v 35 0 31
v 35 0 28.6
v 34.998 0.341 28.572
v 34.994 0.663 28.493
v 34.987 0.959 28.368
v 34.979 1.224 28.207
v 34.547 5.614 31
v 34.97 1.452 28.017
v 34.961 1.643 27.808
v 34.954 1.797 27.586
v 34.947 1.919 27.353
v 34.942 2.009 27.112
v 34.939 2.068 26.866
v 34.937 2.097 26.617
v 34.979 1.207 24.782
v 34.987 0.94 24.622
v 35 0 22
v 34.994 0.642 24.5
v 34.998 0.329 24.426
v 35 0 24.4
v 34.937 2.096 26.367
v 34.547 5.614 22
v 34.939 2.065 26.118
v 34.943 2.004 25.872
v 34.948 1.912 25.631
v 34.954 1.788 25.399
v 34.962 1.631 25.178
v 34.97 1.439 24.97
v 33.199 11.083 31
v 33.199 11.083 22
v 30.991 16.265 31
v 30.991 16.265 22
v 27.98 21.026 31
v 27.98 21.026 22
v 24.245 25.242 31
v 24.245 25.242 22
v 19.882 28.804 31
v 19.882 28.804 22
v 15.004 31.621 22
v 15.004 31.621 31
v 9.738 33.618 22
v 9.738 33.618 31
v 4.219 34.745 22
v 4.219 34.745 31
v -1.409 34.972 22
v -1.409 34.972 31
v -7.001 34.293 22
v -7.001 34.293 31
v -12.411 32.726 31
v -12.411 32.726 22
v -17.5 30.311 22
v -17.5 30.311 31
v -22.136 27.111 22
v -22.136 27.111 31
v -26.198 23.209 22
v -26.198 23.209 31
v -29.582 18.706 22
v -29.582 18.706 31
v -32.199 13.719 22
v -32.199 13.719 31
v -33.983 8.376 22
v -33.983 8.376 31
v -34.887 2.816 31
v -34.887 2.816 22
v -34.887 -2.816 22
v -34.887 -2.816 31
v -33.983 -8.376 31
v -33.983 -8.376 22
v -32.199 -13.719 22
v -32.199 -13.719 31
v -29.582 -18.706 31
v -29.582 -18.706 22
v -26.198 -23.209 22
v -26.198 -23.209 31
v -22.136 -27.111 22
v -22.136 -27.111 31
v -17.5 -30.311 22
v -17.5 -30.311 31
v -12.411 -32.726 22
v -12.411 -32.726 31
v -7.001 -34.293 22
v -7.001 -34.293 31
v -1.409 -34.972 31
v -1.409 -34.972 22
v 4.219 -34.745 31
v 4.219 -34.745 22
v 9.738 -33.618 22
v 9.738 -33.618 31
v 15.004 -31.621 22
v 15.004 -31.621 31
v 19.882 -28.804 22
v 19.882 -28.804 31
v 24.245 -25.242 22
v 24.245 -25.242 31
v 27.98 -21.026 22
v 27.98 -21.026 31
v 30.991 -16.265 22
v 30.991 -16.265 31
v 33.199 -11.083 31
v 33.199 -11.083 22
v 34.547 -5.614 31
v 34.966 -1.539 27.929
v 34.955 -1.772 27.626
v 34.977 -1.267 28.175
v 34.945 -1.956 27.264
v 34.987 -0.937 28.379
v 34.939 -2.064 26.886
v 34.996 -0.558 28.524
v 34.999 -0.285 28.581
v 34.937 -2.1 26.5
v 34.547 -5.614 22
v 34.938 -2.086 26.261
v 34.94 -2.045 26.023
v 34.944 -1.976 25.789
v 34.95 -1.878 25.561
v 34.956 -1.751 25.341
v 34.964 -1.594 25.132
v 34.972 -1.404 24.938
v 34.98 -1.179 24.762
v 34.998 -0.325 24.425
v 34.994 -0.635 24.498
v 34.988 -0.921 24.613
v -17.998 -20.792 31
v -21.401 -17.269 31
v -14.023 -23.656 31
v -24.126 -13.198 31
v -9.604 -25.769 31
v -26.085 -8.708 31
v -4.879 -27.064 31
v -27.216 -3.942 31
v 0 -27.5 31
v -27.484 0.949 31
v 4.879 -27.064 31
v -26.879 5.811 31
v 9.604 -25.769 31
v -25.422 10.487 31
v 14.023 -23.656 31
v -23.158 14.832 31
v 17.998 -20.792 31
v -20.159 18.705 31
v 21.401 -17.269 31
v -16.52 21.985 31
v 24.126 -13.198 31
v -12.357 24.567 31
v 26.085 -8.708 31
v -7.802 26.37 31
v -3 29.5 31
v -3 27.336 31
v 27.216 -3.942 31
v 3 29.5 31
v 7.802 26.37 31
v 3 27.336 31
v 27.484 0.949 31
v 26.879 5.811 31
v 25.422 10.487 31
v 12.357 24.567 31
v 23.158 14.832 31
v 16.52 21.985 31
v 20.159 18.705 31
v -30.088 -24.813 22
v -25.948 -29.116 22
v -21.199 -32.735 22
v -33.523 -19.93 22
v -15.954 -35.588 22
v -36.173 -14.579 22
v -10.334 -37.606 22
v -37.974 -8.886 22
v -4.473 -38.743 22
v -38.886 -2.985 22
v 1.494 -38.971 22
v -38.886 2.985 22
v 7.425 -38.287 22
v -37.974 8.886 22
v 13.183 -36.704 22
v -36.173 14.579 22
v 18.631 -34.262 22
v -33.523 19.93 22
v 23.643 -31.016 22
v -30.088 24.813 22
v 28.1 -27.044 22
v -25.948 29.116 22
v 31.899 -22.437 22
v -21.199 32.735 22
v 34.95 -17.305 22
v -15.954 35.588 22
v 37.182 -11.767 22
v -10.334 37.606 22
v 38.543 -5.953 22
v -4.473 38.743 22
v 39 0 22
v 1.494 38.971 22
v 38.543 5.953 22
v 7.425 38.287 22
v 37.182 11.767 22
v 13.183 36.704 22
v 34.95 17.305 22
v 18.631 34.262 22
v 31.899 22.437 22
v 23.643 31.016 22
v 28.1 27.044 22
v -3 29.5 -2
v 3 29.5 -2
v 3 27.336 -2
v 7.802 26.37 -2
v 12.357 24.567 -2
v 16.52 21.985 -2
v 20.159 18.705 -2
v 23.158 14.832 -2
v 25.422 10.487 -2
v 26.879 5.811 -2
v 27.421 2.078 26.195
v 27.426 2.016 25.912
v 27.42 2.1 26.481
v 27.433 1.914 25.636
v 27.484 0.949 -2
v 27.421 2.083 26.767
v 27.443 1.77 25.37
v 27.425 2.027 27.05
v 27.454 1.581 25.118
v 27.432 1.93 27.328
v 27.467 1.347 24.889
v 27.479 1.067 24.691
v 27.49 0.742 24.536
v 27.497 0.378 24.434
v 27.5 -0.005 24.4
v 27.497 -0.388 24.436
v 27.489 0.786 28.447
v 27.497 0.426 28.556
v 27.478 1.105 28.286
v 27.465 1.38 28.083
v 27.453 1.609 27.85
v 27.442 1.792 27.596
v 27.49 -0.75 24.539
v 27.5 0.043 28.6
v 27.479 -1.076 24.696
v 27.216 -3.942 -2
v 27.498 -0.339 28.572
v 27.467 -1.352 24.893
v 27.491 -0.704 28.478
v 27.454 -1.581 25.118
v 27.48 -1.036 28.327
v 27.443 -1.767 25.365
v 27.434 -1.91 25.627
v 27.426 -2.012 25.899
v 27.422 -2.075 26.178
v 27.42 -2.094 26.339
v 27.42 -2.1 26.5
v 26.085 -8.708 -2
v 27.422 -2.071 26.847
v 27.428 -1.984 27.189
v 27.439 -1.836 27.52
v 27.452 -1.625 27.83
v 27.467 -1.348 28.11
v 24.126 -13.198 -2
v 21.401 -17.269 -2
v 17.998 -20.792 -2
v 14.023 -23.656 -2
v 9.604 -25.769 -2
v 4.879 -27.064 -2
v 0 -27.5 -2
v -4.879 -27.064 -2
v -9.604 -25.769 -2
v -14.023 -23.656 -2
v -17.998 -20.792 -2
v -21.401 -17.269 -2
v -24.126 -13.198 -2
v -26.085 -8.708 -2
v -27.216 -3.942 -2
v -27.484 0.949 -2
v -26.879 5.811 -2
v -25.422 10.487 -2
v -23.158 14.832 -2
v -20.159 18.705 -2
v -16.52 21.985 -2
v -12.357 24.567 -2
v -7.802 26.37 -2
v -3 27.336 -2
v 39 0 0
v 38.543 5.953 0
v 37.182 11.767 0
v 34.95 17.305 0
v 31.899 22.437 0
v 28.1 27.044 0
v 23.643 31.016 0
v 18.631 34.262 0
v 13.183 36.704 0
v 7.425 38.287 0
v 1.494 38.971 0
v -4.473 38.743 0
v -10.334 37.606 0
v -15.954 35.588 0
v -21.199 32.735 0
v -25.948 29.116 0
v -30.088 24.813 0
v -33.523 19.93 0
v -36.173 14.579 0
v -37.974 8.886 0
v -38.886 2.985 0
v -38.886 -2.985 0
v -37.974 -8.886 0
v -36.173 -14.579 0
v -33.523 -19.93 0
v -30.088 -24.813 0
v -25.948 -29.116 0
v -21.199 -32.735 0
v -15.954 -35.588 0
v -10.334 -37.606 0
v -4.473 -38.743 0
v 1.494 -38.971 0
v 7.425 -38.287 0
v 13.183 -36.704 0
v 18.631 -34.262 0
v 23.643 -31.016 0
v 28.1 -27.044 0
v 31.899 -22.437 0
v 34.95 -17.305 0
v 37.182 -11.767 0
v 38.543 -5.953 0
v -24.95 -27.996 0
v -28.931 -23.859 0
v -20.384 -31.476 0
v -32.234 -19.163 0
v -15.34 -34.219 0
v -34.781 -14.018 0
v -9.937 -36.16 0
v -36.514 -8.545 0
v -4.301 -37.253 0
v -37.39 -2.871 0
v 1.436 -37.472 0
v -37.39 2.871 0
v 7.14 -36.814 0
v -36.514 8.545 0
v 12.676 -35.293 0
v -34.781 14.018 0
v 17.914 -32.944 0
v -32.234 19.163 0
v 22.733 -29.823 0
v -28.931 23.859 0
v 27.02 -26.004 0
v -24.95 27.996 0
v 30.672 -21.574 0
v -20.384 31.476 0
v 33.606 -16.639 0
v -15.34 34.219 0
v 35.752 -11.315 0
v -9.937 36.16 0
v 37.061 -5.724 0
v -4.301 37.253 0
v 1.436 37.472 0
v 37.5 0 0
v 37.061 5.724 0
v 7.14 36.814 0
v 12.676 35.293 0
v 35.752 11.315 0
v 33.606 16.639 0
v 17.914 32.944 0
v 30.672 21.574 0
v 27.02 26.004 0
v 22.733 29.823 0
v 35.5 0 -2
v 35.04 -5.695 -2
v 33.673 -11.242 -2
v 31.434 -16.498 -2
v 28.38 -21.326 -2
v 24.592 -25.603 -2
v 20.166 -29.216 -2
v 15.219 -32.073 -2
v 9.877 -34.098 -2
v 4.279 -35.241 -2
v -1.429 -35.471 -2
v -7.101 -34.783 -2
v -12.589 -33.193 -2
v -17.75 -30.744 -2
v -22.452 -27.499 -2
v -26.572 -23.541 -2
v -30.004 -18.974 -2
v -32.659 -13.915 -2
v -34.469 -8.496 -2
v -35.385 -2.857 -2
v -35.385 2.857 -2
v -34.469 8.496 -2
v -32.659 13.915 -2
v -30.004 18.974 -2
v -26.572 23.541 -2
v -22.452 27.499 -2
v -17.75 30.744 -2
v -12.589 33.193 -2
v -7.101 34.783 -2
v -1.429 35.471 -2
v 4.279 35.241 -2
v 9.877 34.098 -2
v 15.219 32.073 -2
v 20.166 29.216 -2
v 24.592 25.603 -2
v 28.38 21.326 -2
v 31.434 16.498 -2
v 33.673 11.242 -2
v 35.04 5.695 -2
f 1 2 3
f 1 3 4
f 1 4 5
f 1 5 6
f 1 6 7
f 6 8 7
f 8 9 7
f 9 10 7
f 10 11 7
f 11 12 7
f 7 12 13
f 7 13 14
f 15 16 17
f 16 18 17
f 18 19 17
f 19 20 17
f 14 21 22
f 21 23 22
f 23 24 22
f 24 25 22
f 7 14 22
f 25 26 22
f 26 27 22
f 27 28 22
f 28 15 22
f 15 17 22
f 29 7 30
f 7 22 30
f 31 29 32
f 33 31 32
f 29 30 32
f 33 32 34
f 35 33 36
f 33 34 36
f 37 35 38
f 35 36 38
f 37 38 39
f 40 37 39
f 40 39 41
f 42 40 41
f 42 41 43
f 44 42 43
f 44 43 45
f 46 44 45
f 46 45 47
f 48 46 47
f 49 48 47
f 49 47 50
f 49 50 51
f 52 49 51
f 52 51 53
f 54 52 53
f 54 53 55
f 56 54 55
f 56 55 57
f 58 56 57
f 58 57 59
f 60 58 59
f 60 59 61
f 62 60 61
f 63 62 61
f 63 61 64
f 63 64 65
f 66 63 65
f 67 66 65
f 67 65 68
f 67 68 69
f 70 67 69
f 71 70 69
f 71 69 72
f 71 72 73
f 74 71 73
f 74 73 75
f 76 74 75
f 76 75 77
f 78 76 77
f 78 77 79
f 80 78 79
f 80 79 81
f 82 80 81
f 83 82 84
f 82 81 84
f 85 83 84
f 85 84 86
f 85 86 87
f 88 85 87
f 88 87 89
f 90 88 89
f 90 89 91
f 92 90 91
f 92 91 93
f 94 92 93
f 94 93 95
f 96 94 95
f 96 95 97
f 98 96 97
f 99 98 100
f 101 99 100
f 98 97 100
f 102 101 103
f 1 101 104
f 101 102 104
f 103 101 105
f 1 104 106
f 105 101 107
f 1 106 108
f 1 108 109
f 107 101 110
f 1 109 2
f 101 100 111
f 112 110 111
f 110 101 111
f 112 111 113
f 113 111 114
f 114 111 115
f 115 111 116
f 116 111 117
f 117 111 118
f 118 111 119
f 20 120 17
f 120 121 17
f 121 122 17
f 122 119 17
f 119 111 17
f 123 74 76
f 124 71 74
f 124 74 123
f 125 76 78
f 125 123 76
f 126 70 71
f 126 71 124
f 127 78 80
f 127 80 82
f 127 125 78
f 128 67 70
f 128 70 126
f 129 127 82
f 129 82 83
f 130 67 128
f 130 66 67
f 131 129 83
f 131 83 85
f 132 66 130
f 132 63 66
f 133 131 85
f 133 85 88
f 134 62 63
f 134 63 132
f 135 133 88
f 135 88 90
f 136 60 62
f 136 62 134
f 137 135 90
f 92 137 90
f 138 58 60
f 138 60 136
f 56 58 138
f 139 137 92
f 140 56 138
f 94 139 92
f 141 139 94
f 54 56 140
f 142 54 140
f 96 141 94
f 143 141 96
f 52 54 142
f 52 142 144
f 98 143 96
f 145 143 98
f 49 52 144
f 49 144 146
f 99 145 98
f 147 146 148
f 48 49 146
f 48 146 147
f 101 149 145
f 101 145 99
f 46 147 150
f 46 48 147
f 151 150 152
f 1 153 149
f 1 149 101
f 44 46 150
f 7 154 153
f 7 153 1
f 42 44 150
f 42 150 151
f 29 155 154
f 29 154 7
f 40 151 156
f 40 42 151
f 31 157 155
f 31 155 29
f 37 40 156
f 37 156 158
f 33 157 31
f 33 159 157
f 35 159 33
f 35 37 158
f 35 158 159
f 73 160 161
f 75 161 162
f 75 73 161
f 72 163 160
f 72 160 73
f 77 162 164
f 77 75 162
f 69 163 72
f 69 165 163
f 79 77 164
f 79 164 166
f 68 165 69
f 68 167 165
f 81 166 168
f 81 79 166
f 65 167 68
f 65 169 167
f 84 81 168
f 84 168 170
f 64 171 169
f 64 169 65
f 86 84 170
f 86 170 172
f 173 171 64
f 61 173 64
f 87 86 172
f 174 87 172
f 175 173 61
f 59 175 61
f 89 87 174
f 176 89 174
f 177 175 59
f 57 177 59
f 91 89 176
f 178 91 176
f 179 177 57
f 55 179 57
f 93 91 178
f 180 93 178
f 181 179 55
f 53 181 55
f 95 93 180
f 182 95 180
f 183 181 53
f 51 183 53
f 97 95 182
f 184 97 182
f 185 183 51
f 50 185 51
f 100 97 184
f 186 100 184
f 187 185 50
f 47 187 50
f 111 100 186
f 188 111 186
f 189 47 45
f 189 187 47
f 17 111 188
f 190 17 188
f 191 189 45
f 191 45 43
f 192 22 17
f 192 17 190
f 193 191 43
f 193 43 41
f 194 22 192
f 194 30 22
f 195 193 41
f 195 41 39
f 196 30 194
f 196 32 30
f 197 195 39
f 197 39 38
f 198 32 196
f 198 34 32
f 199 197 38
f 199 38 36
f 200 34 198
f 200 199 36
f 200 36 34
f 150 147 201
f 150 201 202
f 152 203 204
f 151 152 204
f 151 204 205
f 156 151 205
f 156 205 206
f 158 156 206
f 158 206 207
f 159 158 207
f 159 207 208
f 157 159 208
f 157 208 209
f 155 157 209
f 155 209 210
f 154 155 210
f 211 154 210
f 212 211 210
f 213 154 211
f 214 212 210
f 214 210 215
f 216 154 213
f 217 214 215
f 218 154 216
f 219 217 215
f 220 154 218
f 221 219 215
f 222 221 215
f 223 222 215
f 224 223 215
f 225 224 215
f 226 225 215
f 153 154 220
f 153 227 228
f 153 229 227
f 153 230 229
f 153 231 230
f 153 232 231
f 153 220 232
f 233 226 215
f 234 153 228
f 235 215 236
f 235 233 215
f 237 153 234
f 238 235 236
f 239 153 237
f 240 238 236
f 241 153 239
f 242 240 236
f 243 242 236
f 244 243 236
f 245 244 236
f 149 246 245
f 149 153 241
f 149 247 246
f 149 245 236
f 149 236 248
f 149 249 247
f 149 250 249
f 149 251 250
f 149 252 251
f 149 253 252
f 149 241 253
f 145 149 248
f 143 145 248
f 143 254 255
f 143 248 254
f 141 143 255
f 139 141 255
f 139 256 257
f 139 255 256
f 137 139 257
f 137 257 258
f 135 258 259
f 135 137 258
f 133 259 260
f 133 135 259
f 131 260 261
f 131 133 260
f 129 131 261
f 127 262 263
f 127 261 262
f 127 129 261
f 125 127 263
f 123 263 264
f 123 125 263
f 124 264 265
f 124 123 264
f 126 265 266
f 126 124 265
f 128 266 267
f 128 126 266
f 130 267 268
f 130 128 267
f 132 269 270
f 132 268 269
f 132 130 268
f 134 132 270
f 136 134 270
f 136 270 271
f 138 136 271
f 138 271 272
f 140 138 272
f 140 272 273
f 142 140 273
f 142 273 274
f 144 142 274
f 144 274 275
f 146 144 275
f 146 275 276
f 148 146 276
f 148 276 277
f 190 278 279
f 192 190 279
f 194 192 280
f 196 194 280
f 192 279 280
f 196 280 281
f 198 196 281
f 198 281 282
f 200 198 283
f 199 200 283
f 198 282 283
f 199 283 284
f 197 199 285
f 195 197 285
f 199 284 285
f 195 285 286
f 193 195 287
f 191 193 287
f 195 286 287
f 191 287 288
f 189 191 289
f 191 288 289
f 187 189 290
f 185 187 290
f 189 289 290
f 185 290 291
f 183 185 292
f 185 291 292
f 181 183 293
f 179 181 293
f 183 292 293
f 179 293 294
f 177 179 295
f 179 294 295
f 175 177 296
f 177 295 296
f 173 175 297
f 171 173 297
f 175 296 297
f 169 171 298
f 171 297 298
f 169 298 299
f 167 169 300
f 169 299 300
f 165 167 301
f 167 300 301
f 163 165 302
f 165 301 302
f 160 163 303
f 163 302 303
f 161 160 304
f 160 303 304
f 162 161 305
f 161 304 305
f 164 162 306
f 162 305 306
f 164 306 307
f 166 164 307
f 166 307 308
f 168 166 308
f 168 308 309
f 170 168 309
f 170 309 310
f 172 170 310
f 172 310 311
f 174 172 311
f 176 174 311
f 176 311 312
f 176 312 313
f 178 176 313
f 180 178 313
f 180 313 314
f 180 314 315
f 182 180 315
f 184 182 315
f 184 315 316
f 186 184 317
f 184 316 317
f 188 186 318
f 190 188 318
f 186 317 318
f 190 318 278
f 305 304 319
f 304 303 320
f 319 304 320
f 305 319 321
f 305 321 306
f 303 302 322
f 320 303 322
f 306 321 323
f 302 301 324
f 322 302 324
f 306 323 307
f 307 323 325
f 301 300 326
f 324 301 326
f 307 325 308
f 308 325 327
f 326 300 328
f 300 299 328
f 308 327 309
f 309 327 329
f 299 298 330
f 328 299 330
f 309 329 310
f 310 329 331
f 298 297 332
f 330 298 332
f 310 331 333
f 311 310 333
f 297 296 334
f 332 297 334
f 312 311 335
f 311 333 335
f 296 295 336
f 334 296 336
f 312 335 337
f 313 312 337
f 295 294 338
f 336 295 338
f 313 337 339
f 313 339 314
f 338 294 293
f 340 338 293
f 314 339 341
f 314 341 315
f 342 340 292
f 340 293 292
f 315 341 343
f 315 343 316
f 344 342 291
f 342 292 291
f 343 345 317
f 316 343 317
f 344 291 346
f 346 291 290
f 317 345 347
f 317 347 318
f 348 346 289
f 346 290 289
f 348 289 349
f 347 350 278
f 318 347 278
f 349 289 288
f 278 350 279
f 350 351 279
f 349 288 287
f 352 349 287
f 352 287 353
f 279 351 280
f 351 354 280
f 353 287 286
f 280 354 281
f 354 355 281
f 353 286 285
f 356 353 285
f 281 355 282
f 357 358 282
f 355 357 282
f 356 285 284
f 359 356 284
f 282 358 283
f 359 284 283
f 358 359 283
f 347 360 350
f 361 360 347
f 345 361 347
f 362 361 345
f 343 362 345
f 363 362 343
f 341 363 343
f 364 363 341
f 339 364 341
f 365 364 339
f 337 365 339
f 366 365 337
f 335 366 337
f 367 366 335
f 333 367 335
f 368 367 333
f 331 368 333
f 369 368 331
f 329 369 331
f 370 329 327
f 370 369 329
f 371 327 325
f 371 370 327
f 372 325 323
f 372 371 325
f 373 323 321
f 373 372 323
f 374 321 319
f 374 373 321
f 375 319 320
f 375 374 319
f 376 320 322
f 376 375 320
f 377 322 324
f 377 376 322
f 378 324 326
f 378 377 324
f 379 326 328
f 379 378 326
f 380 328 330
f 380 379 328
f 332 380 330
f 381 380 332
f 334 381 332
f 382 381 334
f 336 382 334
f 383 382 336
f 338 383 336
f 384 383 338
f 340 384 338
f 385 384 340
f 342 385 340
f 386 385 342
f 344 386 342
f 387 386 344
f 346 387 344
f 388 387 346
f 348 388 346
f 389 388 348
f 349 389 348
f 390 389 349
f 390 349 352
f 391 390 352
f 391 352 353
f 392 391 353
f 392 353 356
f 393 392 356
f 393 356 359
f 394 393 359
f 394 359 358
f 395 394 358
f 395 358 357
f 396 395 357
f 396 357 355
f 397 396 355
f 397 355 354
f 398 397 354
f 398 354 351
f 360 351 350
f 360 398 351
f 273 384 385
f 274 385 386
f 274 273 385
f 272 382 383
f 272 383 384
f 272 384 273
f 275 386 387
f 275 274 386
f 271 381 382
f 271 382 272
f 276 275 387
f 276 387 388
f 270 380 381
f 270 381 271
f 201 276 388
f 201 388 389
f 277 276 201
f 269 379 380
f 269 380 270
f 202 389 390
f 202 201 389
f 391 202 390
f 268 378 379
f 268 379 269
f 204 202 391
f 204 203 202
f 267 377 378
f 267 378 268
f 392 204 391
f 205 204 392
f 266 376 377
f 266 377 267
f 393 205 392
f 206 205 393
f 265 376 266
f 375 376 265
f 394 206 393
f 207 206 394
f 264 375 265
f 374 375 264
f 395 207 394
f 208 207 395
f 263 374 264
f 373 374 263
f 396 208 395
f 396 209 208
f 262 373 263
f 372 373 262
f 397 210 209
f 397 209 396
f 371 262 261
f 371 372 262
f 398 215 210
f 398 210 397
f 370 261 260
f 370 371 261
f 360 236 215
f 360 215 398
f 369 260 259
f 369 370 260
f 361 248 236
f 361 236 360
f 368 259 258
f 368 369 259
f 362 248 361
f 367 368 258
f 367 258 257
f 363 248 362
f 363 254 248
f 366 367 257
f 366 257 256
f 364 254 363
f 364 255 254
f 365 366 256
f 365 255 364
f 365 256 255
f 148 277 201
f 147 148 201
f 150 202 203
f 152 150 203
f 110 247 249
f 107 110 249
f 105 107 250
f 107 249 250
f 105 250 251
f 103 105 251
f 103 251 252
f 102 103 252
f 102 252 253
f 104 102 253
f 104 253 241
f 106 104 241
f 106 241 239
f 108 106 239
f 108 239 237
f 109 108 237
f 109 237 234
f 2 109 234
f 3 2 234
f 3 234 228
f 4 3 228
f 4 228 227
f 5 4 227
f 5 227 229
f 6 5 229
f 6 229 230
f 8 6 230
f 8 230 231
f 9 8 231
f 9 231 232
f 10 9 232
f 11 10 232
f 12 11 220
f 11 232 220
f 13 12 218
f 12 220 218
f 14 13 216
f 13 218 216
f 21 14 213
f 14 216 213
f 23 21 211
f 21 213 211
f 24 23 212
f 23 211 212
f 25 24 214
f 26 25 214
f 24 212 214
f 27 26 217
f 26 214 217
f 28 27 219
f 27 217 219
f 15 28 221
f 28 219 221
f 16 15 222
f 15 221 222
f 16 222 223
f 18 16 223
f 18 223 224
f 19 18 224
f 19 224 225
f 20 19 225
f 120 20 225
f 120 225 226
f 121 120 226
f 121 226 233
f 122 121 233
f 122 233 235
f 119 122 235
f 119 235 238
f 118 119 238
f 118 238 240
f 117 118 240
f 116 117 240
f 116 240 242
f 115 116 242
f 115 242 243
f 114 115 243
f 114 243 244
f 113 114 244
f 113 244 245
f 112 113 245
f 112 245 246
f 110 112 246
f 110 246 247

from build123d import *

# Parameters (mm, degrees)
SKETCH1_R             = 39
EXTRUDE1_DEPTH        = 22
SKETCH2_R             = 35
EXTRUDE2_DEPTH        = 9
SKETCH4_R             = 37.5
EXTRUDE4_DEPTH        = 2
EXTRUDE3_DEPTH        = 113
CHAMFER1_SIZE         = 2
M5_TAPPED_HOLE6_D     = 4.2
M5_TAPPED_HOLE6_DEPTH = 24
M5_TAPPED_HOLE6_TIP   = 1.2618073


with BuildPart() as part:
    # Sketch1 → Extrude1 (new body)
    with BuildSketch(Plane.XY):
        Circle(SKETCH1_R)
    extrude(amount=EXTRUDE1_DEPTH)

    # Sketch2 → Extrude2 (add)
    with BuildSketch(Plane.XY.offset(22)):
        Circle(SKETCH2_R)
    extrude(amount=EXTRUDE2_DEPTH)

    # Sketch4 → Extrude4 (add)
    with BuildSketch(Plane(origin=(0, 0, 0), x_dir=(-1, 0, 0), z_dir=(0, 0, -1))):
        with Locations(Location((0, 0, 0), (0, 0, 180))):
            Circle(SKETCH4_R)
    extrude(amount=EXTRUDE4_DEPTH)

    # Sketch3 → Extrude3 (cut)
    with BuildSketch(Plane.XY.offset(31)):
        with BuildLine():
            Line((-3, 29.5), (3, 29.5))
            Line((3, 29.5), (3, 27.335873866))
            ThreePointArc((3, 27.335873866), (0, -27.5), (-3, 27.335873866))
            Line((-3, 27.335873866), (-3, 29.5))
        make_face()
    extrude(amount=-EXTRUDE3_DEPTH, mode=Mode.SUBTRACT)

    # Chamfer1
    chamfer1_edges = [part.edges().sort_by_distance(p)[0] for p in [
        (-37.5, 0, -2),
    ]]
    chamfer(chamfer1_edges, length=CHAMFER1_SIZE - 0.0001)  # a hair under: the kernel refuses the full size

    # M5 Tapped Hole6
    with Locations(Plane(origin=(35, 0, 26.5), x_dir=(0, 1, 0), z_dir=(1, 0, 0))):
        with Locations((0, 0)):
            Hole(M5_TAPPED_HOLE6_D / 2, depth=M5_TAPPED_HOLE6_DEPTH)
            with Locations((0, 0, -(M5_TAPPED_HOLE6_DEPTH + M5_TAPPED_HOLE6_TIP / 2))):  # 118° drill point
                Cone(0, M5_TAPPED_HOLE6_D / 2, M5_TAPPED_HOLE6_TIP, mode=Mode.SUBTRACT)


solid = part.part
